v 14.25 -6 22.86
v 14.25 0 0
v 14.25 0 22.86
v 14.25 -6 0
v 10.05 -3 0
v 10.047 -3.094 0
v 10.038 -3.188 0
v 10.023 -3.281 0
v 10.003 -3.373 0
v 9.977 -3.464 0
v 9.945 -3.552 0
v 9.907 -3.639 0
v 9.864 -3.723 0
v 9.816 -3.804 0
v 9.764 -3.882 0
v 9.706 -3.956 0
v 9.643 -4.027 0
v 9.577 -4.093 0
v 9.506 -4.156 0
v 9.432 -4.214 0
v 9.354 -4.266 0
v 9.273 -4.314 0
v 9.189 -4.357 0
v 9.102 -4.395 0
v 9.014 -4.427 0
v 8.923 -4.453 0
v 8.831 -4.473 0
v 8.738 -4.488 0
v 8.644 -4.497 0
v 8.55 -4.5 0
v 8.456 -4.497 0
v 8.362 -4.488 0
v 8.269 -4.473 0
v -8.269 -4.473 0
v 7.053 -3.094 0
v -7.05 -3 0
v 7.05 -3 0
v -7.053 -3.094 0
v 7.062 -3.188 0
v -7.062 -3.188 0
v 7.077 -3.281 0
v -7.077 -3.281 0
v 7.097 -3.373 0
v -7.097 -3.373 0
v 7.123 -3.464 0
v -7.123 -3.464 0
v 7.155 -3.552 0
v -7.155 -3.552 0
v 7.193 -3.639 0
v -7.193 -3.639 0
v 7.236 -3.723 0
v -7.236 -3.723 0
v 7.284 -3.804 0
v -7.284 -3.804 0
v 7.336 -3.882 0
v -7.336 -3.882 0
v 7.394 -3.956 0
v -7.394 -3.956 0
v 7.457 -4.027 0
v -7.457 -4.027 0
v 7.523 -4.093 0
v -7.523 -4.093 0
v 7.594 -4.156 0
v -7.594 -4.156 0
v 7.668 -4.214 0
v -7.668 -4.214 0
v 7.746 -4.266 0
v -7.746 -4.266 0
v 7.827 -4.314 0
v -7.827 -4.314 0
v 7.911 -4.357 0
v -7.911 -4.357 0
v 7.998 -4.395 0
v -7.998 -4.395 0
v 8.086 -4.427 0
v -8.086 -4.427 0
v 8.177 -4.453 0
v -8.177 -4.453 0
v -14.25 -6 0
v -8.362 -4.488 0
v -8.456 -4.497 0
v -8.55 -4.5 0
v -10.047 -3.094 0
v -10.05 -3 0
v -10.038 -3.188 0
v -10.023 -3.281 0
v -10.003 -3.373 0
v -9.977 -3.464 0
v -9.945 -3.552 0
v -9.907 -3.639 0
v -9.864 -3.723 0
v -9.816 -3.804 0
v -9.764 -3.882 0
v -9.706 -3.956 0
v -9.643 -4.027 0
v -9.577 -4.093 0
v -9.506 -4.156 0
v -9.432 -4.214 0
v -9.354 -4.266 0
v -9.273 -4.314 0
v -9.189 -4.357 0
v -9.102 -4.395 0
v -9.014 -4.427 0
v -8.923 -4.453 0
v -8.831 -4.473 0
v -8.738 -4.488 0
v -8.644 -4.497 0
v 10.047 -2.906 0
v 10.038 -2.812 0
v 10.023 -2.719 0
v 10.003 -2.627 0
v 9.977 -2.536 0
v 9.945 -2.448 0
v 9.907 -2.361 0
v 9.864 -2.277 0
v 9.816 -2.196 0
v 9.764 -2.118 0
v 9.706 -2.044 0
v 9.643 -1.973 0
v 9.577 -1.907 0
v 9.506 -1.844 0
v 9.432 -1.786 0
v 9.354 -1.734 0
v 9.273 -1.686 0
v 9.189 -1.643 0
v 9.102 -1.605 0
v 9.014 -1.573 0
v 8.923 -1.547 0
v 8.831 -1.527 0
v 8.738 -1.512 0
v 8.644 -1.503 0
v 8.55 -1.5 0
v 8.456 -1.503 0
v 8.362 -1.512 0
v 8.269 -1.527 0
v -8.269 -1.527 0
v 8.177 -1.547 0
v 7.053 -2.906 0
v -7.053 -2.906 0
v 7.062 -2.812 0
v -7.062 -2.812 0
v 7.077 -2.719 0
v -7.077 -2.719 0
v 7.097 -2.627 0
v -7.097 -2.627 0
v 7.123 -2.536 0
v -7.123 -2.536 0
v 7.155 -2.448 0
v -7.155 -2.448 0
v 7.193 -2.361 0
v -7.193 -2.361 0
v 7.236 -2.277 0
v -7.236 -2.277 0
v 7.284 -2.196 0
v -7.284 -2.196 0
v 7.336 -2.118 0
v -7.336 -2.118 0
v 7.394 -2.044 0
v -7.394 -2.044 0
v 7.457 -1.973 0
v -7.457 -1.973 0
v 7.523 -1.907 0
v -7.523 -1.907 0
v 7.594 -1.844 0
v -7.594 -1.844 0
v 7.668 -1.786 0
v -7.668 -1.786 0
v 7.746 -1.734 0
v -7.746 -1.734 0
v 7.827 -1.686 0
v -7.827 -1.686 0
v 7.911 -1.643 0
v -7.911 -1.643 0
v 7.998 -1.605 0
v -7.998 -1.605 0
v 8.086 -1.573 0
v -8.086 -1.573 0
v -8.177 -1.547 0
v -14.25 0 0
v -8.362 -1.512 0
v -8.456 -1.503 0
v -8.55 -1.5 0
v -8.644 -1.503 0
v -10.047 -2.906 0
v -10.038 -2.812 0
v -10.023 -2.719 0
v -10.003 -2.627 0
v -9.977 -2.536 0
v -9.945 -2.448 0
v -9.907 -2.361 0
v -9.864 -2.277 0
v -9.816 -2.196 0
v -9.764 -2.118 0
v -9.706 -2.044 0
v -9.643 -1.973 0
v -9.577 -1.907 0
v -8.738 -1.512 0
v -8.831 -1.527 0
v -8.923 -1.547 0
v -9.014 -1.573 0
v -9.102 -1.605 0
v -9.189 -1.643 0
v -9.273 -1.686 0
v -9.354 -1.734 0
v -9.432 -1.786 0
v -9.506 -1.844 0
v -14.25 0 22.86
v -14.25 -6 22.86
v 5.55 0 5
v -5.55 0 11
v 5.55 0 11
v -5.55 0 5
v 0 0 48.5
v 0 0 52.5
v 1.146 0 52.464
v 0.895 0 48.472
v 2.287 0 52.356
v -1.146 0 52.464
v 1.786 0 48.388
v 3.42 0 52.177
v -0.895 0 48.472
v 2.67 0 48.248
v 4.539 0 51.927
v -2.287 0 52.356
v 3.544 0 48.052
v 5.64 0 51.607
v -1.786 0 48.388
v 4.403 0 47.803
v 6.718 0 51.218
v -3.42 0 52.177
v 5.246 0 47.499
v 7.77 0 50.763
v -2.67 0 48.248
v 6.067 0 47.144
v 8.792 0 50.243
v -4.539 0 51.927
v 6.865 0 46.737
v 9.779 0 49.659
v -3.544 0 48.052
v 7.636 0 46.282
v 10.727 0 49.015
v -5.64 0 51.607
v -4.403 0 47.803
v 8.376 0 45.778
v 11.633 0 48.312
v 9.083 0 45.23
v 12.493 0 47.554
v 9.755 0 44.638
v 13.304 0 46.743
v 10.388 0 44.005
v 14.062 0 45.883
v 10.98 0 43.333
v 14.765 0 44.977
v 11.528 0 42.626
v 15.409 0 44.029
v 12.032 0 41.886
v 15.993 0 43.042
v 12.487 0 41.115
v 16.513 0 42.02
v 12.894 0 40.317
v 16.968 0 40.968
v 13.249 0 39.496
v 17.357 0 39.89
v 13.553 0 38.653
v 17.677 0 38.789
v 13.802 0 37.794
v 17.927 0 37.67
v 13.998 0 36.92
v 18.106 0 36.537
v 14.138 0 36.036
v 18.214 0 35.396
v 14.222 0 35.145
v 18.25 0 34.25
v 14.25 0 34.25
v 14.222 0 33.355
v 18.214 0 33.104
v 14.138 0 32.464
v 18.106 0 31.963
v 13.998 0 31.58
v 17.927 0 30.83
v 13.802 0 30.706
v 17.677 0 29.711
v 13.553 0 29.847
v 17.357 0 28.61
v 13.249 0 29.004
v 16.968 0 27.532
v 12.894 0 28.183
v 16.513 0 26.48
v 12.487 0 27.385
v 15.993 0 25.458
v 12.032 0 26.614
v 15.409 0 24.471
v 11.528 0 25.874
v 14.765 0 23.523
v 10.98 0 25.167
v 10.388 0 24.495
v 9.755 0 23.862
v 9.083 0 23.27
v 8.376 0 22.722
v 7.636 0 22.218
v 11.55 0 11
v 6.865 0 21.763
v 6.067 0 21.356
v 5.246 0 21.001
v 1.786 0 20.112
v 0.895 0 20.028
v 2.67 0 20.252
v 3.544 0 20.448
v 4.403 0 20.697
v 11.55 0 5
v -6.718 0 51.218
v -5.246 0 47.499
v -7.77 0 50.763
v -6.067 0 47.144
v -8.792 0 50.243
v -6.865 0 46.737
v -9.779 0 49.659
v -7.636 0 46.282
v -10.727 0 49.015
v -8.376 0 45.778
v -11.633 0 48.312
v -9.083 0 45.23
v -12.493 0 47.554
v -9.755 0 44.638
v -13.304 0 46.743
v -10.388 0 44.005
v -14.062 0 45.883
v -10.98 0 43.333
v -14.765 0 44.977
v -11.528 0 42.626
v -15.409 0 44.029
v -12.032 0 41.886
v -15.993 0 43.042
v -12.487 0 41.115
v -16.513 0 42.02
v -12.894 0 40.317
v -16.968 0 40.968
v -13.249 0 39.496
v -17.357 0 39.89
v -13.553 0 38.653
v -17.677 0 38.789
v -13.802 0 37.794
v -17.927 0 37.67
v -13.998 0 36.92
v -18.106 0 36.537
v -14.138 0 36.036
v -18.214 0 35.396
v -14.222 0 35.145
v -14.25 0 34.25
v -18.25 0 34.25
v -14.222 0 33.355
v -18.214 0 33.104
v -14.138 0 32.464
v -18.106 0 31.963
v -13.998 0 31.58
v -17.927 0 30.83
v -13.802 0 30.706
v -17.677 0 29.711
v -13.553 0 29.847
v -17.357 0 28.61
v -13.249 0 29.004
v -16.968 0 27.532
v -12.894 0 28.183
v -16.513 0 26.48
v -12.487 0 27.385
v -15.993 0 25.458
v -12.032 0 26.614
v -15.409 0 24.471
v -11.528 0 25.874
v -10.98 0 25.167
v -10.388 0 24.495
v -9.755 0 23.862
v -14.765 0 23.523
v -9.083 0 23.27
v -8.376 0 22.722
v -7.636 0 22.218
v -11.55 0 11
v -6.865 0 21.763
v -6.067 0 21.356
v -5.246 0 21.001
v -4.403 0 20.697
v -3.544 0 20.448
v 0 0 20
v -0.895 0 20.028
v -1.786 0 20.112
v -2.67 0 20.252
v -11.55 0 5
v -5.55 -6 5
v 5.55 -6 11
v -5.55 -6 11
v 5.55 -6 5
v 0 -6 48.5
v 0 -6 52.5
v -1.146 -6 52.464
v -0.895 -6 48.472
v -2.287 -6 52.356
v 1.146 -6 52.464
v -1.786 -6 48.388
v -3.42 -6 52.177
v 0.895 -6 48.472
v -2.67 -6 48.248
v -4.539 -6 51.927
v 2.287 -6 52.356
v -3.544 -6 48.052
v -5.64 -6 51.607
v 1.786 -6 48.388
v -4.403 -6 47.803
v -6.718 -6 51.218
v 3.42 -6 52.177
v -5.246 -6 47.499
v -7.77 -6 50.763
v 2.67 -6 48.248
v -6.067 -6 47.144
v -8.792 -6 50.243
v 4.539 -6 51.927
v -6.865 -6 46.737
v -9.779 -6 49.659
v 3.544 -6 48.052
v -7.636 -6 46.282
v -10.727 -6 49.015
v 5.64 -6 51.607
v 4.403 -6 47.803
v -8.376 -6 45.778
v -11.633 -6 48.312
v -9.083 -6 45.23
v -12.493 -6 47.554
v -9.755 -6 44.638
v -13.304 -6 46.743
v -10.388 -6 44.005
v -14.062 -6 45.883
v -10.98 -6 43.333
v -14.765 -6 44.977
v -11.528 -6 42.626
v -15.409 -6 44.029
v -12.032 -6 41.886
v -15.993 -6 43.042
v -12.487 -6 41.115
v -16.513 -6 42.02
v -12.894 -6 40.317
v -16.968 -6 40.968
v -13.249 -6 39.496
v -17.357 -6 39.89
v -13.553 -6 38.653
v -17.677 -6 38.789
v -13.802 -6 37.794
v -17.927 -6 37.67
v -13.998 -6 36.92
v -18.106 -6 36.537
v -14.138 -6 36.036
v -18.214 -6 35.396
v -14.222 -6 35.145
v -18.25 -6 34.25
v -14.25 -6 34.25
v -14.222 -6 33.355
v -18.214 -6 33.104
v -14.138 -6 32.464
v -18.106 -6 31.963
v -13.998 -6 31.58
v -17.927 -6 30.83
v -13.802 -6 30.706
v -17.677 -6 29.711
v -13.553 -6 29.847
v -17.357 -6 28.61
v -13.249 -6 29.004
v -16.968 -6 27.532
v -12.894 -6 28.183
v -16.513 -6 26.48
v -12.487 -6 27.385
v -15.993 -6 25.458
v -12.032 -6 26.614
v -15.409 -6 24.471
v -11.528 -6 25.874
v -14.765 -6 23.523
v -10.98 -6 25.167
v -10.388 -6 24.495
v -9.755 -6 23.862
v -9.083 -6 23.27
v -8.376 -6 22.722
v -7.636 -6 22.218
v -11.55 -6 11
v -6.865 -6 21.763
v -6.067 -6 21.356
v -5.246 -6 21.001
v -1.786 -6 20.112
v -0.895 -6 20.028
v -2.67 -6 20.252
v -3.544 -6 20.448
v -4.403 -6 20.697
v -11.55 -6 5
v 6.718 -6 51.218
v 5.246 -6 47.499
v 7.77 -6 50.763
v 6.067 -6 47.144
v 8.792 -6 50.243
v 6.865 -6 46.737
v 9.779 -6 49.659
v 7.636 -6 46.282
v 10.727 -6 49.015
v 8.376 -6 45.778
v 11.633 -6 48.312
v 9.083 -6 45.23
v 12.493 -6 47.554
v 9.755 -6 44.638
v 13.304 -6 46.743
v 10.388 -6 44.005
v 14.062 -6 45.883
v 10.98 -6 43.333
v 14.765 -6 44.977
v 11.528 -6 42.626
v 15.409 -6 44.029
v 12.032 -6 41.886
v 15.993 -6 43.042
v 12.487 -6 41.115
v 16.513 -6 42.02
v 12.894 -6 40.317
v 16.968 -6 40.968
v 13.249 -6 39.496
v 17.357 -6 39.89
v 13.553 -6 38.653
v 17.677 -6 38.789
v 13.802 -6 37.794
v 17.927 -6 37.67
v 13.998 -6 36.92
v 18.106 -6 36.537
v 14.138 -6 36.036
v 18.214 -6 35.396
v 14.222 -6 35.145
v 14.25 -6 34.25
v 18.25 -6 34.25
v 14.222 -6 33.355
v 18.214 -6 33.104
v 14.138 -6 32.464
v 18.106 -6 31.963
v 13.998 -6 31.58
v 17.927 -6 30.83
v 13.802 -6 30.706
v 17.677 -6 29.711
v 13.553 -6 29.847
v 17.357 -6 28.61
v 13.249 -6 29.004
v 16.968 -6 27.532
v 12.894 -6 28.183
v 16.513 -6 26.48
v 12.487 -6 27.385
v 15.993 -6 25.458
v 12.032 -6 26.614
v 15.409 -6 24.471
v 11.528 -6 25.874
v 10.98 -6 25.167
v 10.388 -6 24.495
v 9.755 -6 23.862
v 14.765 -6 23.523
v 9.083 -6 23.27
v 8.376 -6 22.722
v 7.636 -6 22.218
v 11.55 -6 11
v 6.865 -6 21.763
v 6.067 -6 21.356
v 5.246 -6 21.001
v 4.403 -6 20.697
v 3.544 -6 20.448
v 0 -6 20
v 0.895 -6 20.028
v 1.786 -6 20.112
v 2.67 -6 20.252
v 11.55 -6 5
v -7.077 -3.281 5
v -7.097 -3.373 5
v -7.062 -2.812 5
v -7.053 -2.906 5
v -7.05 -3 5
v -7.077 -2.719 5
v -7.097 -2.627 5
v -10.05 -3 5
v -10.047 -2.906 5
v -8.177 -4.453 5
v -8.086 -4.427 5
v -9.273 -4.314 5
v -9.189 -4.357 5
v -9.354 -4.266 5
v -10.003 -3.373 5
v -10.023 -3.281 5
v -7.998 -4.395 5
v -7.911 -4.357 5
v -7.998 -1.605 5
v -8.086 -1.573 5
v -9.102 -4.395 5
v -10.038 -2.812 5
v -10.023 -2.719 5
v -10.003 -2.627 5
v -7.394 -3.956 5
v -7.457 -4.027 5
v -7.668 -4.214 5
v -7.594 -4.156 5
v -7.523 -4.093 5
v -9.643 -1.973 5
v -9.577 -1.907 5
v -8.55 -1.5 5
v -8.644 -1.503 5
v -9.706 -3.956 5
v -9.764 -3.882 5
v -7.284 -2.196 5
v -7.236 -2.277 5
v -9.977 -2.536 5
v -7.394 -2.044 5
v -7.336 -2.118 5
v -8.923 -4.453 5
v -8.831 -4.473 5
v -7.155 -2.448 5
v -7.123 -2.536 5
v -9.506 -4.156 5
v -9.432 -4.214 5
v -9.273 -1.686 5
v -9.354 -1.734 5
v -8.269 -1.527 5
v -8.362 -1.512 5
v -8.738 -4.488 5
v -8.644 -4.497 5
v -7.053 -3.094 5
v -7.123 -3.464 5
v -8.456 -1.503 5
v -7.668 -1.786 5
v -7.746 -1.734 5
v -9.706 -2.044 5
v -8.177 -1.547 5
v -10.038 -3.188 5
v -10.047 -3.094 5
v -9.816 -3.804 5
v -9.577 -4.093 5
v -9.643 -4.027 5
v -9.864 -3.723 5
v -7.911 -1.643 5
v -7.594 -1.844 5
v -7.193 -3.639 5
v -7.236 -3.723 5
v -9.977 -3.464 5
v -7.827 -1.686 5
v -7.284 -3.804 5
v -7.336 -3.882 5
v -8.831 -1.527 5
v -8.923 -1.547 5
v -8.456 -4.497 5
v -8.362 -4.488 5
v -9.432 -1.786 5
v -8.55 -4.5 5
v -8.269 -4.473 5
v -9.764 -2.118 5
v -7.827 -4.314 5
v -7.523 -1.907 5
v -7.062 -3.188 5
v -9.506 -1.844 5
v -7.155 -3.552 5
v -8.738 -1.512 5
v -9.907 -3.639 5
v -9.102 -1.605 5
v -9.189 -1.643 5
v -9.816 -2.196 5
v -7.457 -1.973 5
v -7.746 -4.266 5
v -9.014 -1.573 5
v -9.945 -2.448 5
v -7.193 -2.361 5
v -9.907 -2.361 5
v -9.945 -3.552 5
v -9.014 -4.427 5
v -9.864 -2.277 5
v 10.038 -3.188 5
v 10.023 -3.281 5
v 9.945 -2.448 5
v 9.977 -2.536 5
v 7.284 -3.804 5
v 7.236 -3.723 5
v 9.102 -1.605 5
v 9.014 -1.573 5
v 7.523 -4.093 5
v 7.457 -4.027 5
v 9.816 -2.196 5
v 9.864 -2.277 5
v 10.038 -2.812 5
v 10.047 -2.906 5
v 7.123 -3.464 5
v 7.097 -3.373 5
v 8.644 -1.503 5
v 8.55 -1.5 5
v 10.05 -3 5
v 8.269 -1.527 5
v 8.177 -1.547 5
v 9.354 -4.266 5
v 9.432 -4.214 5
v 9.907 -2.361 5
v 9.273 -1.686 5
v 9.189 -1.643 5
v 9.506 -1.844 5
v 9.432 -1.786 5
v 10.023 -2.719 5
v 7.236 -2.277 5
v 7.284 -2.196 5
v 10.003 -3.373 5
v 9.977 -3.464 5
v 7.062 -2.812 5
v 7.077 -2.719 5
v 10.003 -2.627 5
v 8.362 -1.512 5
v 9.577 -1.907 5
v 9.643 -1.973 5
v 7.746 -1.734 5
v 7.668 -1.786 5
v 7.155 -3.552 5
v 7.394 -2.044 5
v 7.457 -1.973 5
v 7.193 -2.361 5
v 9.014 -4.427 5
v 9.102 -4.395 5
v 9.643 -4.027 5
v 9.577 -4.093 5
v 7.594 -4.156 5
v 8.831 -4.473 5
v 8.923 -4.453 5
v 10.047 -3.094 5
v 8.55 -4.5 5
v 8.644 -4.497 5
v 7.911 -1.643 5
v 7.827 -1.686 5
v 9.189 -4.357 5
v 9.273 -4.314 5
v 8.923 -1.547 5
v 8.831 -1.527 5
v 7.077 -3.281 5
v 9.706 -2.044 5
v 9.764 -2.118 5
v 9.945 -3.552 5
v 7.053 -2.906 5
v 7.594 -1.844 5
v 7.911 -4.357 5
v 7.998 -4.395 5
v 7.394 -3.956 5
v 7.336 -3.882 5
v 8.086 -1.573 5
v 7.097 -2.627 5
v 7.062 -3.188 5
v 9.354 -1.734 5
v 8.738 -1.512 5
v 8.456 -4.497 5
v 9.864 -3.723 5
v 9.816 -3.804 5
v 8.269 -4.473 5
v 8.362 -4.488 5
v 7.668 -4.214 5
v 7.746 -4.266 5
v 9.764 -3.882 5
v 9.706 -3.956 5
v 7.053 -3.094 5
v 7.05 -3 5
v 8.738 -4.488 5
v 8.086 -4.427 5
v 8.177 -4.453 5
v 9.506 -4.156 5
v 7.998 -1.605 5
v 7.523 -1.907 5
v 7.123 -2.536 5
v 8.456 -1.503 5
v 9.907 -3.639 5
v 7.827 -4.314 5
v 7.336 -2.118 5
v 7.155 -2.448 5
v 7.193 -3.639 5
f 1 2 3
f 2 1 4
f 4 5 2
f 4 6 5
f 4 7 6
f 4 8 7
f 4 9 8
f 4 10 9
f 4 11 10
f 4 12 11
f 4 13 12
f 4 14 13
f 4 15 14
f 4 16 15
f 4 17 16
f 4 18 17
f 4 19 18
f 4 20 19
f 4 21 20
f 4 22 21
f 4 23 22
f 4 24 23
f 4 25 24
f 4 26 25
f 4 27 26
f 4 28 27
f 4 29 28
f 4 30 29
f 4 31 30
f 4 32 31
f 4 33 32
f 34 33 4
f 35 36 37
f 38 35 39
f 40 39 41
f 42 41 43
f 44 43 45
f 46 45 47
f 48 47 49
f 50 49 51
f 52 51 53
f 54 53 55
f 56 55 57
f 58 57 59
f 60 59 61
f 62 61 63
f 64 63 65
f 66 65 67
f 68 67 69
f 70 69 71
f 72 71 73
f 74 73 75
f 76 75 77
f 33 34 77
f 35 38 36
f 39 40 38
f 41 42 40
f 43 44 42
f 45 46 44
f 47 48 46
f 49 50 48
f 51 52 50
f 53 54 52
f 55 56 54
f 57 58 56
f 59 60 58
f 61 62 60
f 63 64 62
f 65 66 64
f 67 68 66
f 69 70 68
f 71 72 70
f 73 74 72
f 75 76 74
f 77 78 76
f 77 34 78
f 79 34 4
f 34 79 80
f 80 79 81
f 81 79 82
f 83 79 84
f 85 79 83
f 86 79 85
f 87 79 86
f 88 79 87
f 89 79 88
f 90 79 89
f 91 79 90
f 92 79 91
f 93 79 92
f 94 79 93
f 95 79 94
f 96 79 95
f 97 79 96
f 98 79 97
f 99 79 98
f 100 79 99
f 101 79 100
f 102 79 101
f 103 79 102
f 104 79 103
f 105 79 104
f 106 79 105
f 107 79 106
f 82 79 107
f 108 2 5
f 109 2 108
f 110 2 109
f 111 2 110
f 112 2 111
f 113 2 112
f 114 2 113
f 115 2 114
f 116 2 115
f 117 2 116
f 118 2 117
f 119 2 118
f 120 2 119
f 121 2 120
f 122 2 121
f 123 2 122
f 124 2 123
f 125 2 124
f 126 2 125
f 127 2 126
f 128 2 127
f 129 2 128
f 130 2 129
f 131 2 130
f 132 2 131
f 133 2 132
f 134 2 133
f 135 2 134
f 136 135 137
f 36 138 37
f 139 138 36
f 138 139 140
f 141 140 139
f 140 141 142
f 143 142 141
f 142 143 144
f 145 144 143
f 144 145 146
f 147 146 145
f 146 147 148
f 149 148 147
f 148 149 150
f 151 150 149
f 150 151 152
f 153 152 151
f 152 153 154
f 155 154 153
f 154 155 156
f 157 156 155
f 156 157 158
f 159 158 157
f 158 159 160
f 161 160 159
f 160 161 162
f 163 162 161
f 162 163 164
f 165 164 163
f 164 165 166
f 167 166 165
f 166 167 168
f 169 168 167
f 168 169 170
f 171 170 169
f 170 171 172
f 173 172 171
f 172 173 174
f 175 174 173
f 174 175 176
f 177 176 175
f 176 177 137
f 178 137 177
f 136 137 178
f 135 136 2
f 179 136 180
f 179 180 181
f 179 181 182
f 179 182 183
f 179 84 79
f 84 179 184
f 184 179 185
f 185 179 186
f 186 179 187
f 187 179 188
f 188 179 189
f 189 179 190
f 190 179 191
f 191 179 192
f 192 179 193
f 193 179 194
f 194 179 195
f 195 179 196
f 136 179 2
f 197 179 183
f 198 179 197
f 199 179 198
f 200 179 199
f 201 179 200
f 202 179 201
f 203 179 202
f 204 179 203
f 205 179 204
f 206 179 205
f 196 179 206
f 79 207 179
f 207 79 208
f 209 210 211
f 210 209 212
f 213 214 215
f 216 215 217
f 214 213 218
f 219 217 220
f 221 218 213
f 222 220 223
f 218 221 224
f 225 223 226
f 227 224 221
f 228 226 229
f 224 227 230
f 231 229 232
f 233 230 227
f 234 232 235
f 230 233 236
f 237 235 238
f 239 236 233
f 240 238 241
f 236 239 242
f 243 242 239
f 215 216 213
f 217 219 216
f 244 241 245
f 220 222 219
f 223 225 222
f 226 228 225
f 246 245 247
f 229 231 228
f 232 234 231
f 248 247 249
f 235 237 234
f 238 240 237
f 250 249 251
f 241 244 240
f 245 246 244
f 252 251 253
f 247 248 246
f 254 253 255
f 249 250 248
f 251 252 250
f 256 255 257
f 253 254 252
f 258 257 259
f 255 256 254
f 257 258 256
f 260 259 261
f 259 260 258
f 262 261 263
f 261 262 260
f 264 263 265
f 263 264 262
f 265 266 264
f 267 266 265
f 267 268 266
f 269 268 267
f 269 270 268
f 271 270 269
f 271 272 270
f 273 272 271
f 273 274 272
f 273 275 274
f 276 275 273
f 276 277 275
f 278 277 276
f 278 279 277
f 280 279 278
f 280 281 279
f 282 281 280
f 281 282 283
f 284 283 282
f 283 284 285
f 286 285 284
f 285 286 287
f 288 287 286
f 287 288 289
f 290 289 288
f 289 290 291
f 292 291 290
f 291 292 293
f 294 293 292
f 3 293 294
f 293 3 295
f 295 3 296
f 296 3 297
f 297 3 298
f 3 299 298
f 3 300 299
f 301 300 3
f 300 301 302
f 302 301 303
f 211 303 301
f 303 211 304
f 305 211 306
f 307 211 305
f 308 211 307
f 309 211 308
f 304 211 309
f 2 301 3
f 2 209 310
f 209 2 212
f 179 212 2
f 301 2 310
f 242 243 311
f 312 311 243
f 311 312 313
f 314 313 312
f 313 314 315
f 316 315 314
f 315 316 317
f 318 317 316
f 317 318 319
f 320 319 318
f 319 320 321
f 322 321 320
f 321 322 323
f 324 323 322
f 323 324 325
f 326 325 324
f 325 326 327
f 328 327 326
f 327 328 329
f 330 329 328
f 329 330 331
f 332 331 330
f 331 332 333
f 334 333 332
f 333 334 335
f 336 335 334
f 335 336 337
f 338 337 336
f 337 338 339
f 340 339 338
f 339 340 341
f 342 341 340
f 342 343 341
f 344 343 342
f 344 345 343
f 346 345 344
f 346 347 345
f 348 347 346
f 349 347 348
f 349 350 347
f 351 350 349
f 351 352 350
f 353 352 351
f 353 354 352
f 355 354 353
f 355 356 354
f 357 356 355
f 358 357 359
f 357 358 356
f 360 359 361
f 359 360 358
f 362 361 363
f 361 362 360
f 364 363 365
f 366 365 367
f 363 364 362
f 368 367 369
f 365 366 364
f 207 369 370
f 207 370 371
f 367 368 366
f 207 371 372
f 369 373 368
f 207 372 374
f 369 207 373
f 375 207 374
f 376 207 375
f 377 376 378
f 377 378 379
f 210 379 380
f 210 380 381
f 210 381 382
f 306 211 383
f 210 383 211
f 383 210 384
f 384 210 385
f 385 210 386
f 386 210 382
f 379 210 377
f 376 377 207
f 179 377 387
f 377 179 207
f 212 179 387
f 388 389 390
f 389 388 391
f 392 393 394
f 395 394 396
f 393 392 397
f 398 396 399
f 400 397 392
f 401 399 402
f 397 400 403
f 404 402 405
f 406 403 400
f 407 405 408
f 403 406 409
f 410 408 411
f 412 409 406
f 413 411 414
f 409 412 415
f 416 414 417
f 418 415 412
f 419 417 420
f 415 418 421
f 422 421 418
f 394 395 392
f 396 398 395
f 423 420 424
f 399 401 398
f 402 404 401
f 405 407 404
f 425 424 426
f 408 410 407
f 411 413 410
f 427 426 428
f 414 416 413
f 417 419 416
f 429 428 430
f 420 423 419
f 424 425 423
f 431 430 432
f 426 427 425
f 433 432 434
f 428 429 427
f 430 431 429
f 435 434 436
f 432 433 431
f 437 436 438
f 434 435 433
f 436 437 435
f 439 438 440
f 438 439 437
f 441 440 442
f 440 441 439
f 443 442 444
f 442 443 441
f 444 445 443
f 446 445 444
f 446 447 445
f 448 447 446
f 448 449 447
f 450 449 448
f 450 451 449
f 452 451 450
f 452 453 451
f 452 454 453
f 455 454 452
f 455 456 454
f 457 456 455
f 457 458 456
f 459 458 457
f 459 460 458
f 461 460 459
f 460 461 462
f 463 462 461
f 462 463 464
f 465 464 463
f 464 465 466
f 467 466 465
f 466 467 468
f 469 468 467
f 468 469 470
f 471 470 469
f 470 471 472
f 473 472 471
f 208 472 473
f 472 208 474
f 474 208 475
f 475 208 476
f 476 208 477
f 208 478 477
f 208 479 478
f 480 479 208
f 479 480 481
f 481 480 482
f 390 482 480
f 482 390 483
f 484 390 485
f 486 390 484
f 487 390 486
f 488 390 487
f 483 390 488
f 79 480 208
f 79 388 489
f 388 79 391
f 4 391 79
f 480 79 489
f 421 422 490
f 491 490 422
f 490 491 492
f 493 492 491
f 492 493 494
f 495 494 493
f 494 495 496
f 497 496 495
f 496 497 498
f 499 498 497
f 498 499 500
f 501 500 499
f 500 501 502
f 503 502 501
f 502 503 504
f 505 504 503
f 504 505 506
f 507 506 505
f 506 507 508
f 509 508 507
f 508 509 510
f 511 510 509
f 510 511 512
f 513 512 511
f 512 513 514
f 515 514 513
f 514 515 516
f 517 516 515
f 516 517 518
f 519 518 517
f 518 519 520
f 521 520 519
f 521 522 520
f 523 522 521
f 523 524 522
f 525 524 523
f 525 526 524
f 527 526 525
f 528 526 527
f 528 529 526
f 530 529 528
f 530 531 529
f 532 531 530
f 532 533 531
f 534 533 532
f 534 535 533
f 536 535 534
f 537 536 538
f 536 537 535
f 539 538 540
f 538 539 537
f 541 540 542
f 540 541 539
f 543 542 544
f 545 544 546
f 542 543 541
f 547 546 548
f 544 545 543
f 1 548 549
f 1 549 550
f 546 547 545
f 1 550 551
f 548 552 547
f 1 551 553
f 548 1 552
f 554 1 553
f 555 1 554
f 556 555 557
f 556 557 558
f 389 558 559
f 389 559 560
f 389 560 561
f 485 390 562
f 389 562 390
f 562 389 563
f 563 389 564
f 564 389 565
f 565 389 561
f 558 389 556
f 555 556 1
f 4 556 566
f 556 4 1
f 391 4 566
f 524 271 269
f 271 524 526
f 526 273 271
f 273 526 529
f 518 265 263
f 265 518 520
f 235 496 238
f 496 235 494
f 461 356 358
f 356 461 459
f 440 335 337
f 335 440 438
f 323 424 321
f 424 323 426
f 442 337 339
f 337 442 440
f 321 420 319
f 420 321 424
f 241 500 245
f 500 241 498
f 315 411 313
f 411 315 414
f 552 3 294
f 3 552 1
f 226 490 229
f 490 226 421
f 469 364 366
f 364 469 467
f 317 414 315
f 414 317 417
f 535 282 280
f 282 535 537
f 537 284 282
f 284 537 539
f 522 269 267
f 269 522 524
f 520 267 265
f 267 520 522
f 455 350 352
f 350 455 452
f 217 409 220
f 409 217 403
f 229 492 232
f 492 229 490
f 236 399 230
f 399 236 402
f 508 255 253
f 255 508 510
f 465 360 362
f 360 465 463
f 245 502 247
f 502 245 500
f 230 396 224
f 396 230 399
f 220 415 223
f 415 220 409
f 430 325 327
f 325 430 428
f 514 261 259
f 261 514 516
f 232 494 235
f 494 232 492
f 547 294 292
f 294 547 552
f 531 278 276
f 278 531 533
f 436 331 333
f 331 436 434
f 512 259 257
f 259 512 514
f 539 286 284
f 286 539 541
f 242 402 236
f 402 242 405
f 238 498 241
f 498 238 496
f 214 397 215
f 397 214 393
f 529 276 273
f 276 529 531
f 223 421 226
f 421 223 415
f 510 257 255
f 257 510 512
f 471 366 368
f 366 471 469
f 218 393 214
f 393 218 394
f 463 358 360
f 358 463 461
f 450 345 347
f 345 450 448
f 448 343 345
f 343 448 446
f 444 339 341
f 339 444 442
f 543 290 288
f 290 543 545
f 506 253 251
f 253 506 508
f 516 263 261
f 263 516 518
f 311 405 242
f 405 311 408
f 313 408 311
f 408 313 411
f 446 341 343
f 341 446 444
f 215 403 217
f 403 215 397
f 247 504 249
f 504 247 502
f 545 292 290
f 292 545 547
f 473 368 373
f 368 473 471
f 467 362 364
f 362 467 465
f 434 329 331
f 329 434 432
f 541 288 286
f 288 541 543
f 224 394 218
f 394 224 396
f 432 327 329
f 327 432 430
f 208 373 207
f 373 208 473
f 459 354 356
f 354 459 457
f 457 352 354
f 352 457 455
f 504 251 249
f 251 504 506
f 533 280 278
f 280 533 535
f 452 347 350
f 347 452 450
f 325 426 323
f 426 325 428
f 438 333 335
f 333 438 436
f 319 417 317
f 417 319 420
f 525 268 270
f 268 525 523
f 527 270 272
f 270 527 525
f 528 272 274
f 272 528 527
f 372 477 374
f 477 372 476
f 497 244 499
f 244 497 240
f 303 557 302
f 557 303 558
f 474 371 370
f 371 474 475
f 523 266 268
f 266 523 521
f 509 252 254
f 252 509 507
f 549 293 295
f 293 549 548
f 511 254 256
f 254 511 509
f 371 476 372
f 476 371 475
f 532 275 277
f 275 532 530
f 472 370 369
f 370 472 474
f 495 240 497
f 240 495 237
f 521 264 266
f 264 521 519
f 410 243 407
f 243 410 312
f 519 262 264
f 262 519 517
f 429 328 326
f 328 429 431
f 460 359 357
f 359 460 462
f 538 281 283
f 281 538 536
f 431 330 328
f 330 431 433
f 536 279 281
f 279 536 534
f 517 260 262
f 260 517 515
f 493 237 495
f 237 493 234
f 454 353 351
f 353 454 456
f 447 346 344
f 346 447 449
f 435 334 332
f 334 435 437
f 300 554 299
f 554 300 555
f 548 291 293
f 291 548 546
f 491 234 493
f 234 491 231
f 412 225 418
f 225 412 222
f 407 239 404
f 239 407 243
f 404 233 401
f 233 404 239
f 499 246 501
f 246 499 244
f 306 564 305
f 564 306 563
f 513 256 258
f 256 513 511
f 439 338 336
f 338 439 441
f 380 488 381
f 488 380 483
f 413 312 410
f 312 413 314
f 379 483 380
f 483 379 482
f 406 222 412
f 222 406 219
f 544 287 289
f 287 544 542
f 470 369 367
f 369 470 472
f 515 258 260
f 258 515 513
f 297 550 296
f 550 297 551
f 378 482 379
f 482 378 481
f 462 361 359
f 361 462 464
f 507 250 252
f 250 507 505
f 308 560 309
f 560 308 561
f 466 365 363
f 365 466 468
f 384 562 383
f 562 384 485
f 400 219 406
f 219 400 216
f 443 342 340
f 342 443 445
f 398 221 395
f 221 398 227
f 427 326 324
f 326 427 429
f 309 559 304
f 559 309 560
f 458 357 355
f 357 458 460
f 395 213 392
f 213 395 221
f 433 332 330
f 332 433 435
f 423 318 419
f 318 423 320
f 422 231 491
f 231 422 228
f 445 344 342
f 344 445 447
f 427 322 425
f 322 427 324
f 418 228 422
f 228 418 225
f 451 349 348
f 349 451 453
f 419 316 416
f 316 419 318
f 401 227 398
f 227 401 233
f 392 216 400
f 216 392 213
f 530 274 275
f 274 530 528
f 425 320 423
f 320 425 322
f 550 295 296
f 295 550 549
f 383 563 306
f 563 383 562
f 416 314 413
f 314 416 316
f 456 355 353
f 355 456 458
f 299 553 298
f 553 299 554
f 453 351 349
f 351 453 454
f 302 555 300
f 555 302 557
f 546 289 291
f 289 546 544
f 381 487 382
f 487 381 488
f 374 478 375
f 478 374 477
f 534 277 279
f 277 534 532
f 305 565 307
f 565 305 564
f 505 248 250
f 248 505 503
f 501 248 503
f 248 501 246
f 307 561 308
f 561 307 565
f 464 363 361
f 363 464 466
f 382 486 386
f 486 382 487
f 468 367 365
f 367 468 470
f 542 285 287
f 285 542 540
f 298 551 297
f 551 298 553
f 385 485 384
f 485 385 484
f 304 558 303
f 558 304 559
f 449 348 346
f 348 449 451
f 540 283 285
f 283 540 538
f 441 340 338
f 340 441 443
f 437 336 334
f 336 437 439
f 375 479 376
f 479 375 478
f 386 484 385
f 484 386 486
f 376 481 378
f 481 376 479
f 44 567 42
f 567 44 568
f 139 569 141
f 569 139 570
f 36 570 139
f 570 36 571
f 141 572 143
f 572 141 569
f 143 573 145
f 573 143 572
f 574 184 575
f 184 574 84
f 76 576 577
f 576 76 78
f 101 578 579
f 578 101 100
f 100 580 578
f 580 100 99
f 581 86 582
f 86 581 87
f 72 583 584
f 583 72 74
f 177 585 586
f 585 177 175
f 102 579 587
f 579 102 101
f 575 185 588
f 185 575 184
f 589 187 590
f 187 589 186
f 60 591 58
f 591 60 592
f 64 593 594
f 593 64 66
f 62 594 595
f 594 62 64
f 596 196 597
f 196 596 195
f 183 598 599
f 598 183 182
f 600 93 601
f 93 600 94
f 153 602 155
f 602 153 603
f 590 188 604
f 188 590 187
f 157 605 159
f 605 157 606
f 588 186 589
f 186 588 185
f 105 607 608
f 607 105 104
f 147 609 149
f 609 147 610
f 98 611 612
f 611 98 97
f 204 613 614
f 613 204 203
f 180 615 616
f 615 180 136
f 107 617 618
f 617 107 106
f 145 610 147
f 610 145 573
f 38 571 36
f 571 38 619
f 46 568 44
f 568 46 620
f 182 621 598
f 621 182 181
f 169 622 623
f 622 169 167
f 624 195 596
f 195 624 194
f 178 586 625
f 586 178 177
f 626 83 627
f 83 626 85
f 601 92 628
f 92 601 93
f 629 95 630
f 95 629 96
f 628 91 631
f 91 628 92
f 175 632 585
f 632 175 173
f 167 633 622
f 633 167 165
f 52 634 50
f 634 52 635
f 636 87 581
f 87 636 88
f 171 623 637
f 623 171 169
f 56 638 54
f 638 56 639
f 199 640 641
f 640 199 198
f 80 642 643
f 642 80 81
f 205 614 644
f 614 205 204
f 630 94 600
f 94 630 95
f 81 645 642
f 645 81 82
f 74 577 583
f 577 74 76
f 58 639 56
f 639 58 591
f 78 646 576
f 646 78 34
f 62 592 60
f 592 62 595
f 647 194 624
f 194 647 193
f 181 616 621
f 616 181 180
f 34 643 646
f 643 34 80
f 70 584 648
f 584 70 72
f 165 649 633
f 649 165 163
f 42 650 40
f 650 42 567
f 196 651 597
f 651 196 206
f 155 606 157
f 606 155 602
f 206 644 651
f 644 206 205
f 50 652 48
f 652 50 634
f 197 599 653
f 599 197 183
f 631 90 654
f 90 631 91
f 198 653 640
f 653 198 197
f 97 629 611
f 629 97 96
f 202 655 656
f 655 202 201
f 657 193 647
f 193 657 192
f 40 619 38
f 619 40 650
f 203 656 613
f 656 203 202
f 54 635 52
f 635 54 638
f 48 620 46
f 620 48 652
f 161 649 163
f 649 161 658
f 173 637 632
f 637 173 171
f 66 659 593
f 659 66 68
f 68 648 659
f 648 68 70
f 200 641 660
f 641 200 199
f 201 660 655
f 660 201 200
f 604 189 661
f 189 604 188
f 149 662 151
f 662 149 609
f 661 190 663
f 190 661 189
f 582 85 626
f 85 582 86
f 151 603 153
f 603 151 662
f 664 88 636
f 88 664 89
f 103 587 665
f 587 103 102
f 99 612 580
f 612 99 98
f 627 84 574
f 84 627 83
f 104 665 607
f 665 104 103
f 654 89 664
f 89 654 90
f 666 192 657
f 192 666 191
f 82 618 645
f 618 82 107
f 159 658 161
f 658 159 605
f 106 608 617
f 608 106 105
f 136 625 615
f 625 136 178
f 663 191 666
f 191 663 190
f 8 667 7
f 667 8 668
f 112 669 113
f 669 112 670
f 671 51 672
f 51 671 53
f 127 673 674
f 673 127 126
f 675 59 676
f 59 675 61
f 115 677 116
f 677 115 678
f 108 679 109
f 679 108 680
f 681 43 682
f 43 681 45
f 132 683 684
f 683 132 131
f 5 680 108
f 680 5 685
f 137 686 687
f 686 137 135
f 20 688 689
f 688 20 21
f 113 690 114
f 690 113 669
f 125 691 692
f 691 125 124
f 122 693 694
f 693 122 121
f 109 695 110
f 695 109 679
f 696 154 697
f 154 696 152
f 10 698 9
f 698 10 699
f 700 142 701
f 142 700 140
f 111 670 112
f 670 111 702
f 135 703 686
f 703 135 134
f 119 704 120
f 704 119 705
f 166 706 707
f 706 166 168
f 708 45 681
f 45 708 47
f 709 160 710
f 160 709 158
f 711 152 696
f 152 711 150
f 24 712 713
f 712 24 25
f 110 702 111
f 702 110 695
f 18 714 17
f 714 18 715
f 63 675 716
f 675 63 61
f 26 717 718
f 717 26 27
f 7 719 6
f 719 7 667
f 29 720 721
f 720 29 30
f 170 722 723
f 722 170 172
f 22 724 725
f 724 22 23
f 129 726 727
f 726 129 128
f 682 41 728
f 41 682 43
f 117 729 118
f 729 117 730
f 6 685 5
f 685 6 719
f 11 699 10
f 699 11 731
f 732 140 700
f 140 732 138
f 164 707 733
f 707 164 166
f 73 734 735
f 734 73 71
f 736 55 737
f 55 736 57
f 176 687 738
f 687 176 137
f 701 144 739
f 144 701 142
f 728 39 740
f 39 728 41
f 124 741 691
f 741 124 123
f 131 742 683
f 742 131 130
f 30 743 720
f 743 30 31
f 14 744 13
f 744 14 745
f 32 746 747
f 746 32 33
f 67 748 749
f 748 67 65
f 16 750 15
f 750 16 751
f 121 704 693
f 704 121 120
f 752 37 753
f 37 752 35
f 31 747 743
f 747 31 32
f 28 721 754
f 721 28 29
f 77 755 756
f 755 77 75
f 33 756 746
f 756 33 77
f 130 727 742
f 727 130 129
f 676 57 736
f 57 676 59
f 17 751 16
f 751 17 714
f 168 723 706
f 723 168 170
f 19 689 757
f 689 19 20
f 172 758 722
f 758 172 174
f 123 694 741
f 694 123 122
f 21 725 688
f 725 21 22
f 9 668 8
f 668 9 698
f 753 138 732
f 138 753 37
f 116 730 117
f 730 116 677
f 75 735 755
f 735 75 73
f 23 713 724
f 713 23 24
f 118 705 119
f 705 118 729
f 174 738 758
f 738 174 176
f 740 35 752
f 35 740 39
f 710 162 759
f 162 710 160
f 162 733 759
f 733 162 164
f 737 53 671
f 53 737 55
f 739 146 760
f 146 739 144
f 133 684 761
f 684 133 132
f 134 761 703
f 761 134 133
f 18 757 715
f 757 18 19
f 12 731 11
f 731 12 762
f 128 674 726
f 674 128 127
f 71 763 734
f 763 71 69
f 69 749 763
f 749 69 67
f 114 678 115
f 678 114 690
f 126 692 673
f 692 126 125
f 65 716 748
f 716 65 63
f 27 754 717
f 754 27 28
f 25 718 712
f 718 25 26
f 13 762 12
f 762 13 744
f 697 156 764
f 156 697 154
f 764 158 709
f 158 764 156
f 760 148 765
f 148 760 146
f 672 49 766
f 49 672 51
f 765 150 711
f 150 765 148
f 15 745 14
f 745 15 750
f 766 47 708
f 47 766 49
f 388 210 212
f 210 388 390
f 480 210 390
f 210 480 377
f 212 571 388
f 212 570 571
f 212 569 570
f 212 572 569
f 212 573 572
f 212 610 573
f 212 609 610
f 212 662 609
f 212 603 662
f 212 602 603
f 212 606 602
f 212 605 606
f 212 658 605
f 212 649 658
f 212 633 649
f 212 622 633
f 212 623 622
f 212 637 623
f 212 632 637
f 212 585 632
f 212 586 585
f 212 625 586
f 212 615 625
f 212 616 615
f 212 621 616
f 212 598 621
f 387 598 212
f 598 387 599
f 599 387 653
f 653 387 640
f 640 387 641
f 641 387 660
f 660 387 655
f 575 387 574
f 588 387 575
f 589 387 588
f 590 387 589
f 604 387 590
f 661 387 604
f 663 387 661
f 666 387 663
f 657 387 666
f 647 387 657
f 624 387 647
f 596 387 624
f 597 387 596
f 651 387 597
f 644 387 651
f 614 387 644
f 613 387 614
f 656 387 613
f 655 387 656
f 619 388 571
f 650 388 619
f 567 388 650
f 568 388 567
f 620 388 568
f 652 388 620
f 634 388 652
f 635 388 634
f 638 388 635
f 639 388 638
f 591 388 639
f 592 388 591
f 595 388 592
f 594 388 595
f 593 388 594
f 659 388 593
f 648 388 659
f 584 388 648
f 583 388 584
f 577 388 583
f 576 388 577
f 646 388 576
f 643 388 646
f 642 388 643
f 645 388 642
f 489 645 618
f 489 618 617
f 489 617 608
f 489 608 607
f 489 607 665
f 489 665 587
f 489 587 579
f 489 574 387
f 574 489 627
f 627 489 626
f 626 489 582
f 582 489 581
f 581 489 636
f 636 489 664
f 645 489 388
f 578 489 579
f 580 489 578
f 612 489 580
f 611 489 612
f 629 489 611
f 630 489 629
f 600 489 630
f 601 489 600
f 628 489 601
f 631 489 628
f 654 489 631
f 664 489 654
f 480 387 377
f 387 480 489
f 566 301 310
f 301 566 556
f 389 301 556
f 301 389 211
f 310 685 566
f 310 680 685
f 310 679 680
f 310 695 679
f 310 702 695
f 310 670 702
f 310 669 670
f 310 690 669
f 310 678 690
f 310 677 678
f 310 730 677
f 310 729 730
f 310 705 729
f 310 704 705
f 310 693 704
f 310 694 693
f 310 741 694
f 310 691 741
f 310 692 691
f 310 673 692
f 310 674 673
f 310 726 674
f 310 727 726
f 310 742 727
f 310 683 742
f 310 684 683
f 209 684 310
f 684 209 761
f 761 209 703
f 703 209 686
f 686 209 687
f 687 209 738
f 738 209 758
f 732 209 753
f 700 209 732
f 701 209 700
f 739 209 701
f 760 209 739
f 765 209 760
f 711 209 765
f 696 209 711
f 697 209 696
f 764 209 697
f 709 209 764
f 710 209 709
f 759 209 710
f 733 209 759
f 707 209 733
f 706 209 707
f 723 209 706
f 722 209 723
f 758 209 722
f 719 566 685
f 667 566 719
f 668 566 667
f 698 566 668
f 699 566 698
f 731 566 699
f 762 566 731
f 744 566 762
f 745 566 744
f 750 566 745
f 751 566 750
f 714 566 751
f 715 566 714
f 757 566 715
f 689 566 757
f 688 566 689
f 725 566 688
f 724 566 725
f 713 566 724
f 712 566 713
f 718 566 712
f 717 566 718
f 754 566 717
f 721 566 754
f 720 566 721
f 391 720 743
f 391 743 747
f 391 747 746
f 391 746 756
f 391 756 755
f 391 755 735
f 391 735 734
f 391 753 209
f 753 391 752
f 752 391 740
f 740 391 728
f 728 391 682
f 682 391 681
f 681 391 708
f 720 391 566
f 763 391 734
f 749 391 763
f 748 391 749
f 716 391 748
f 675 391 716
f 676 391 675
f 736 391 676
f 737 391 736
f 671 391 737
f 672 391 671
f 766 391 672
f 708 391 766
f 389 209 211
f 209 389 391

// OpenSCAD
$fn = 100;

signal_cap_dia = 28.5;
signal_cap_thickness = 6;
wall = 2;
stand_height = 30;

difference() {
  union () {
    translate([-signal_cap_dia/2, -signal_cap_thickness, 0])
      cube([signal_cap_dia,signal_cap_thickness,stand_height]);

    translate([0,0,signal_cap_dia/2+stand_height-10])
      rotate([90,0,0])
      cylinder(r=signal_cap_dia/2+wall*2, h=signal_cap_thickness);
  }
  translate([0,1,signal_cap_dia/2+stand_height-10])
    rotate([90,0,0])
    cylinder(r=signal_cap_dia/2, h=signal_cap_thickness+2);

  // screw holes
  translate([-signal_cap_dia*0.3,-signal_cap_thickness/2,-1])
    cylinder(r=1.5, h=5+2);

  translate([+signal_cap_dia*0.3,-signal_cap_thickness/2,-1])
    cylinder(r=1.5, h=5+2);

  // nut holes
  translate([-signal_cap_dia*0.3-3,-signal_cap_thickness-1,5])
    cube([6, signal_cap_thickness+2, 6]);
  translate([+signal_cap_dia*0.3-3,-signal_cap_thickness-1,5])
    cube([6, signal_cap_thickness+2, 6]);

}
